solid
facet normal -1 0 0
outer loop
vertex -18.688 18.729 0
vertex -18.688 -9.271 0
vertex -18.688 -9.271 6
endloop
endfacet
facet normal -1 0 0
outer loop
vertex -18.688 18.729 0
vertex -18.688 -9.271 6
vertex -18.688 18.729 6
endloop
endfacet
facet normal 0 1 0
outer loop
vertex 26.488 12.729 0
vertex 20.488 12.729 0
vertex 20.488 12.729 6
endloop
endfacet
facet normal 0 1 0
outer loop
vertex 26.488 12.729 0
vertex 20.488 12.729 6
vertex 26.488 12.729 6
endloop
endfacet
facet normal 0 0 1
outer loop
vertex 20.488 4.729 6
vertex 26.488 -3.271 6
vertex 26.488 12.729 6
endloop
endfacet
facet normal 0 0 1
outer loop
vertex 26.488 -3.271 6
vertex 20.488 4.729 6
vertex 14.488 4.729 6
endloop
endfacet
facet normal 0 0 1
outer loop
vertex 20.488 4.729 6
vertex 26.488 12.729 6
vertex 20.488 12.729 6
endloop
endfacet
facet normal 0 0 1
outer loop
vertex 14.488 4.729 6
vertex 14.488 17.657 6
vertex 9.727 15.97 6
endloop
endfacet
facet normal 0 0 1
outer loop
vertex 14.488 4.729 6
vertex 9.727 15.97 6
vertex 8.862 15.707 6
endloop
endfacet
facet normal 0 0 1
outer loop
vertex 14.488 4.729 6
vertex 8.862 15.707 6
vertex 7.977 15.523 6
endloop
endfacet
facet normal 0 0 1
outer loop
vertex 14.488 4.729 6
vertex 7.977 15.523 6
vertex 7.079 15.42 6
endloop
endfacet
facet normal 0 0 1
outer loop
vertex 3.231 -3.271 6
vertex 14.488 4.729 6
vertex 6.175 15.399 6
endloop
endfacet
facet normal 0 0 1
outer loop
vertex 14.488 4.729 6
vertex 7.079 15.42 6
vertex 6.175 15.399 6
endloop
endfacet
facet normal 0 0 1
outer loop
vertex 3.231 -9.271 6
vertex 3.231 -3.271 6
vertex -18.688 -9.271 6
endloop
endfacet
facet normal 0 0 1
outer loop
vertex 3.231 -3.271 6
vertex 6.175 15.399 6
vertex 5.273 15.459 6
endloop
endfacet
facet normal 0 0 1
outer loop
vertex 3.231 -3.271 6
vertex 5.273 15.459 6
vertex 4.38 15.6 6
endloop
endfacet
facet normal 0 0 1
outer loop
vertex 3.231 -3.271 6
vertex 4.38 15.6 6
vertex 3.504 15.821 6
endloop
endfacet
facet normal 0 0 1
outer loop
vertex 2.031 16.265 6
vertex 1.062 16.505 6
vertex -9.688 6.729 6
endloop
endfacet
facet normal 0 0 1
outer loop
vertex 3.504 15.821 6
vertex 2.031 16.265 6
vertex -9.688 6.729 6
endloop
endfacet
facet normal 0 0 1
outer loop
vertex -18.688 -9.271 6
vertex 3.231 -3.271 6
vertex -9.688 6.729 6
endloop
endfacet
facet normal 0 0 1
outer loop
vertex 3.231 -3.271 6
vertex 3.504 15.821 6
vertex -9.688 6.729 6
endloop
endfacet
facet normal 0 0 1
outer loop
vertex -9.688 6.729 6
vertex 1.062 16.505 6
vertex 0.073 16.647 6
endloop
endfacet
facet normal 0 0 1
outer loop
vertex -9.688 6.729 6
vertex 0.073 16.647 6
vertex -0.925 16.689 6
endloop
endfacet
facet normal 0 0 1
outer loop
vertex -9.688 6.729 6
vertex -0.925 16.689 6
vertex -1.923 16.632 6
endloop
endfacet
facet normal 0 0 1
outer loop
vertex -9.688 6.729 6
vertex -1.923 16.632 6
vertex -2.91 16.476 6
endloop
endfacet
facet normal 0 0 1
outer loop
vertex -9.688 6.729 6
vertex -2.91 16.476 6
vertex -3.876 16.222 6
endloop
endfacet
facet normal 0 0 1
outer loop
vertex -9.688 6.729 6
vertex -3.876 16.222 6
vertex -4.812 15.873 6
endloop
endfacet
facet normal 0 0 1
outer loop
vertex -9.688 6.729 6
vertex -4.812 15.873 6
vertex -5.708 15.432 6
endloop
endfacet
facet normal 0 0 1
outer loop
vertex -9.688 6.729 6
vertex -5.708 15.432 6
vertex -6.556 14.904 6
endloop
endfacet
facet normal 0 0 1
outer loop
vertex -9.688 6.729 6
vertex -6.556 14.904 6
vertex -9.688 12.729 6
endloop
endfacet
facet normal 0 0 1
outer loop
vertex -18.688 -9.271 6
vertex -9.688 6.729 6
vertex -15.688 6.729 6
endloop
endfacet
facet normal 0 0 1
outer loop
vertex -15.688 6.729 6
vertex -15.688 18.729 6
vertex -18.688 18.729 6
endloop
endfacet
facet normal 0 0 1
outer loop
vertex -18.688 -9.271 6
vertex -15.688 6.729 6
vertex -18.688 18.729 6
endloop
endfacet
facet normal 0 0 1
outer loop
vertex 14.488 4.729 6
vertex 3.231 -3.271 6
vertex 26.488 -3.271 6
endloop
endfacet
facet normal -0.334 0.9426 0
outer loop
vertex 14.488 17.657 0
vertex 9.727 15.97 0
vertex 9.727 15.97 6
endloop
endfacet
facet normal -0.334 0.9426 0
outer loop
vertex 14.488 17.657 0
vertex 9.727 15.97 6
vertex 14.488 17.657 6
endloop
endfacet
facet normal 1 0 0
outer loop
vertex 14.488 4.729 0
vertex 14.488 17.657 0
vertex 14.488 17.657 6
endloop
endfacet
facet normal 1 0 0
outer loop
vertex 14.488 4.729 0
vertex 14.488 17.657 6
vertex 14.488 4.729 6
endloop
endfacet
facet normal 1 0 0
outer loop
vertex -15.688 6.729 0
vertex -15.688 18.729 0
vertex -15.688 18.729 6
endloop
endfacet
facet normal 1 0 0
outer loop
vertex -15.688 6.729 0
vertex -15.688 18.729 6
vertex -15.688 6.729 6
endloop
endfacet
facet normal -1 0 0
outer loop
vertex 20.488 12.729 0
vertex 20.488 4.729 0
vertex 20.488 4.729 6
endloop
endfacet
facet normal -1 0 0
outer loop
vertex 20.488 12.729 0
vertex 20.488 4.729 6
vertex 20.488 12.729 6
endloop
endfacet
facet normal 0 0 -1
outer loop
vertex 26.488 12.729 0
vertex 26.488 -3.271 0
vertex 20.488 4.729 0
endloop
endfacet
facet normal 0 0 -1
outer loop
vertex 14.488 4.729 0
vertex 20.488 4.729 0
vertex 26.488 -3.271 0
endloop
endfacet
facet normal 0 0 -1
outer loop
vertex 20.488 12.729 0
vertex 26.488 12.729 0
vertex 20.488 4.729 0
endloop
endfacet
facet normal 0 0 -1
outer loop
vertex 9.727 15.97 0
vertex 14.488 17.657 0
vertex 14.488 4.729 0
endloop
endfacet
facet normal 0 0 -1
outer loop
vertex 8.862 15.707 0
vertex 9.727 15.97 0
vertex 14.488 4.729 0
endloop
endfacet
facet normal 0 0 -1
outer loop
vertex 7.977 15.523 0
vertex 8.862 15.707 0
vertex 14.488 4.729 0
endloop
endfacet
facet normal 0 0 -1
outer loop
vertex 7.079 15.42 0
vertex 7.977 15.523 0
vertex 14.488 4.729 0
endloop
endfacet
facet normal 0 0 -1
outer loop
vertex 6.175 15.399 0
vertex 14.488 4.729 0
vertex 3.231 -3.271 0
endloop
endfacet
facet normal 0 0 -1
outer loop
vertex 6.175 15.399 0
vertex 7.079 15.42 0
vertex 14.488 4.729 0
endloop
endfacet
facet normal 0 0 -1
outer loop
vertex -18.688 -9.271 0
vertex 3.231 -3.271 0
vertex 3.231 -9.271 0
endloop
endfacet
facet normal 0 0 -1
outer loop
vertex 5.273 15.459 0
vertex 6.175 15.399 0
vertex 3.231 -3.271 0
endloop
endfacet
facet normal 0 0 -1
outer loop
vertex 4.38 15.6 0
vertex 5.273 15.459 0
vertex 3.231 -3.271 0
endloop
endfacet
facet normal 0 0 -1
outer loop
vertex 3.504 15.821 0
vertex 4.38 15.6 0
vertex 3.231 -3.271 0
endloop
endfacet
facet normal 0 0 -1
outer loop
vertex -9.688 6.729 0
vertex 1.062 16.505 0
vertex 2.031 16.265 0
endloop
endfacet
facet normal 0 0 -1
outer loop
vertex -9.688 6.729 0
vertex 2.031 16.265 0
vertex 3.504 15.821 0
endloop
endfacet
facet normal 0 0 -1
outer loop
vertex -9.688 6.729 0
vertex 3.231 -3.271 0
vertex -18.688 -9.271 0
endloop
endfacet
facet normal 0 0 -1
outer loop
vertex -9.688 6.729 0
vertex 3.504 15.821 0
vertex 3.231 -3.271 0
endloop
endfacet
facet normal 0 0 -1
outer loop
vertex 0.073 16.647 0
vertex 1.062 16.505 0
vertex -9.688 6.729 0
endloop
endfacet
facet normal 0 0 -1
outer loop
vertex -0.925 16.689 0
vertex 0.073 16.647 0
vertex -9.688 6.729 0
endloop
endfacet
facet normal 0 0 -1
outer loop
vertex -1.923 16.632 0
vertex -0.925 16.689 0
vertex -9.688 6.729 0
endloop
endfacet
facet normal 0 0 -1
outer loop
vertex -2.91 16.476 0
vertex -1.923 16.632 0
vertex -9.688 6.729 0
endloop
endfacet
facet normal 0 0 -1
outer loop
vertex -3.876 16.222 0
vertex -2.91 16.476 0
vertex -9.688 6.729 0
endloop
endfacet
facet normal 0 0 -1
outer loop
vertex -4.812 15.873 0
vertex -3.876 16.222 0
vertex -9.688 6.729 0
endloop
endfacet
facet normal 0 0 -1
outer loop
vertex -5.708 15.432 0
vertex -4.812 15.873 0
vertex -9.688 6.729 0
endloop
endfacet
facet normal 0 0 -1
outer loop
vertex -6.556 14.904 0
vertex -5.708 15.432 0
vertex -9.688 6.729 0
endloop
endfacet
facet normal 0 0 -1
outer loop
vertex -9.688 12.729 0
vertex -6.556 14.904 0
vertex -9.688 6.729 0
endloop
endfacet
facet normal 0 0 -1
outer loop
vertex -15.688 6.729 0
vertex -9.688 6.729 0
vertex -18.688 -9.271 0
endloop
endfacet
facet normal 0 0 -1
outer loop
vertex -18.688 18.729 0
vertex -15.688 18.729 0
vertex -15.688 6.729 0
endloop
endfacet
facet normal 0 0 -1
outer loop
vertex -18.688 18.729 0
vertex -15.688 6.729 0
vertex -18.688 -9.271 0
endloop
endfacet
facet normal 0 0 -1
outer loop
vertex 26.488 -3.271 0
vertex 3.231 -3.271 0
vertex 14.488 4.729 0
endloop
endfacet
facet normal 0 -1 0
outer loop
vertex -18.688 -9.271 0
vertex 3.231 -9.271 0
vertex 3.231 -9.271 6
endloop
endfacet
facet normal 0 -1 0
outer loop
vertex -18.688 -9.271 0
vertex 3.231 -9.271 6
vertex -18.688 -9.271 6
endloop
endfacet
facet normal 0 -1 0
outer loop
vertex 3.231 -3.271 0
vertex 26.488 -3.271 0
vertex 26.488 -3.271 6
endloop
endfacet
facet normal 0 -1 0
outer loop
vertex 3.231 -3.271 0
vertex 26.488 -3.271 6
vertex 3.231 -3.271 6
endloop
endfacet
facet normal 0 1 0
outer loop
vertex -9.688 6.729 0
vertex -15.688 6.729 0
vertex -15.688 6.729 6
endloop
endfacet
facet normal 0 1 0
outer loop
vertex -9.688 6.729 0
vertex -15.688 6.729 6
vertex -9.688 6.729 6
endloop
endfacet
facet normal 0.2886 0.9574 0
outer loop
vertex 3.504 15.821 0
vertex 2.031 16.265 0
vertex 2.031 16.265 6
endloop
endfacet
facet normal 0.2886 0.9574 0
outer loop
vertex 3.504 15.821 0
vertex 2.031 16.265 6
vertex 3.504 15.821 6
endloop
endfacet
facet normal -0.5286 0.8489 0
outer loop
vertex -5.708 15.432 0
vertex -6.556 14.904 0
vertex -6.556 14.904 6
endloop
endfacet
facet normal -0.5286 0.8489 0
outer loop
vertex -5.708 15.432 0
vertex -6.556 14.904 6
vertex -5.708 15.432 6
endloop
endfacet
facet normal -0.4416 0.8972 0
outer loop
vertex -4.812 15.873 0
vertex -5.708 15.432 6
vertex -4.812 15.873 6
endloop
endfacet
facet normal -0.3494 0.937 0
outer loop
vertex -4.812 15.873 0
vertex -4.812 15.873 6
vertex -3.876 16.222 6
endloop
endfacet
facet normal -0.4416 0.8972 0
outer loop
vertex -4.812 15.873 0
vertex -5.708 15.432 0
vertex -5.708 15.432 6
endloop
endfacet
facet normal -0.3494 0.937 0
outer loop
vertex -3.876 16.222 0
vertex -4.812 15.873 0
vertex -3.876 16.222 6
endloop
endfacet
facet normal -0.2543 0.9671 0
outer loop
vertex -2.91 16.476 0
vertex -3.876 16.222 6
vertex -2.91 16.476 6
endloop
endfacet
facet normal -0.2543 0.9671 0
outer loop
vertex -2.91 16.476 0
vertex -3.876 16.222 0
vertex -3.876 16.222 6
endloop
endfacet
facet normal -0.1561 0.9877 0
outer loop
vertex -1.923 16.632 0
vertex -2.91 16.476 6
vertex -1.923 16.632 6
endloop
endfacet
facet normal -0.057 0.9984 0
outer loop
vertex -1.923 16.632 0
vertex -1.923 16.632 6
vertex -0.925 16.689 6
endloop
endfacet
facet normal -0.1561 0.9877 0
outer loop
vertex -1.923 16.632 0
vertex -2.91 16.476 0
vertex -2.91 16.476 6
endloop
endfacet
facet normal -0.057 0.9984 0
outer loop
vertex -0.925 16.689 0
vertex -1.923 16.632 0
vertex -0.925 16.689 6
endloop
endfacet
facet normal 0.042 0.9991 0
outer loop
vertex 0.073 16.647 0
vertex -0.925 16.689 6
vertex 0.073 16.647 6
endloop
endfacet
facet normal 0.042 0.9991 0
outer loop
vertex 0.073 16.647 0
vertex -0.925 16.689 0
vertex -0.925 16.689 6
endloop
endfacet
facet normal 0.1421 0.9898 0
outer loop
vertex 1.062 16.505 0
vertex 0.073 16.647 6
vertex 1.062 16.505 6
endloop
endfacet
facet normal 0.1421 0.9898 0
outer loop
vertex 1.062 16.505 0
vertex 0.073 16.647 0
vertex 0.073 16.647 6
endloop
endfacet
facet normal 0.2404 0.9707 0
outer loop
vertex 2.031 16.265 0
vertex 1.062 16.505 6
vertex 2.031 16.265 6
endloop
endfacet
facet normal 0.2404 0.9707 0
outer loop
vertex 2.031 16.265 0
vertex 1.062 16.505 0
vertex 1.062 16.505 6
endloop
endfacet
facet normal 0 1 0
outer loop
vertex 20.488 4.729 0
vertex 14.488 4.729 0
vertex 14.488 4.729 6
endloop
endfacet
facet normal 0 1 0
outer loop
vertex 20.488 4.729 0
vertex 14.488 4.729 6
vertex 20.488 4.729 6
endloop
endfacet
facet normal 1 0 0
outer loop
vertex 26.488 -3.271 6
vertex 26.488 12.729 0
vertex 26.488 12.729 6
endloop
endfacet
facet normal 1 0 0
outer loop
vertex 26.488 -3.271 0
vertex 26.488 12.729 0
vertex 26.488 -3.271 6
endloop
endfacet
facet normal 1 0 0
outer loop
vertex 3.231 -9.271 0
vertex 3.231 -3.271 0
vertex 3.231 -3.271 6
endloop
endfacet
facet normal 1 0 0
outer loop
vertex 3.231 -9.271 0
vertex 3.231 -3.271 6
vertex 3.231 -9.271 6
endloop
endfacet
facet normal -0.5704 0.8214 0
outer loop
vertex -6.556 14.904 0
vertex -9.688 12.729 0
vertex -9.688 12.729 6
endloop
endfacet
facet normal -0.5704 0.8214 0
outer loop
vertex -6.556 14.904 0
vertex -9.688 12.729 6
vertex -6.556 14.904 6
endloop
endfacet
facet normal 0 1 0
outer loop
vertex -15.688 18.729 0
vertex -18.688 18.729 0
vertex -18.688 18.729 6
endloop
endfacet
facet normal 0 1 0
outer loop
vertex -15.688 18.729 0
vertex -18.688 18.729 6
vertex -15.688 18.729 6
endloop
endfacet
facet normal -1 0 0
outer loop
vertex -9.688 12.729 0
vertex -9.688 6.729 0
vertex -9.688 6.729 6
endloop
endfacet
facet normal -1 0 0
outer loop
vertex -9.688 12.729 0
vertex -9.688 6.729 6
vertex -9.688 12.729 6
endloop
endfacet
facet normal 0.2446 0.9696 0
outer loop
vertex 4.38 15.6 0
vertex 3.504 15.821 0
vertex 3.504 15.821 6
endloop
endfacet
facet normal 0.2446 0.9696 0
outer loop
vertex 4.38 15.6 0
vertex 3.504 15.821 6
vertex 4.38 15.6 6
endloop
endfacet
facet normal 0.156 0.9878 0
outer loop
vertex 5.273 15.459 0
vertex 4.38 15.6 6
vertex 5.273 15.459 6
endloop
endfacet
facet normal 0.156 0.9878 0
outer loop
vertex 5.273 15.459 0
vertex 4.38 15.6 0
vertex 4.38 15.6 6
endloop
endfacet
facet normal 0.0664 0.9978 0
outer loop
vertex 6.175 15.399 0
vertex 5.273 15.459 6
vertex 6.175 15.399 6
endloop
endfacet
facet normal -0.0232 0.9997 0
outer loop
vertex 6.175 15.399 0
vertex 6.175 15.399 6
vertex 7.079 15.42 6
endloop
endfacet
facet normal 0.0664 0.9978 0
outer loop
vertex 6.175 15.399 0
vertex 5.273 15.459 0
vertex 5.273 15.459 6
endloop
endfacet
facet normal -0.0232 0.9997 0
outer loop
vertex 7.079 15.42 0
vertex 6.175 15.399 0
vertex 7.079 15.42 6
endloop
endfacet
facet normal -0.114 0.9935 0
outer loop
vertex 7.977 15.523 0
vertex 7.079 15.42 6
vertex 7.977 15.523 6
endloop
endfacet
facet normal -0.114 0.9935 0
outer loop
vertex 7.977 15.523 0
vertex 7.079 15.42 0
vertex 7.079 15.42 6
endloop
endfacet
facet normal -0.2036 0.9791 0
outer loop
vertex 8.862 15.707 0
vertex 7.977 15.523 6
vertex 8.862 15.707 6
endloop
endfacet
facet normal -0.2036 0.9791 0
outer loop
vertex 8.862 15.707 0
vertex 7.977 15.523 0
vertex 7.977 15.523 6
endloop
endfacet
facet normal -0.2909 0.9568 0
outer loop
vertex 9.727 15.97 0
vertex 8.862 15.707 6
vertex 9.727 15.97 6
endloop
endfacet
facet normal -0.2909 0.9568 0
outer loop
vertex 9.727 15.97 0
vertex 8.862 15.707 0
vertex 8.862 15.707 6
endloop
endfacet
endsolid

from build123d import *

# Parameters (mm, degrees)
BOSS_EXTRUDE1_DEPTH = 6


with BuildPart() as part:
    # Sketch1 → Boss-Extrude1 (new body)
    with BuildSketch(Plane.XY):
        with BuildLine():
            Line((-18.687702572, 18.729195928), (-15.687702572, 18.729195928))
            Line((-15.687702572, 18.729195928), (-15.687702572, 6.729195928))
            Line((-15.687702572, 6.729195928), (-9.687702572, 6.729195928))
            Line((-9.687702572, 6.729195928), (-9.687702572, 12.729195928))
            Line((-9.687702572, 12.729195928), (-6.556235979, 14.903596974))
            ThreePointArc((-6.556235979, 14.903596974), (-2.418100544, 16.566329788), (2.031378501, 16.264698373))
            Line((2.031378501, 16.264698373), (3.503651069, 15.82124278))
            ThreePointArc((3.503651069, 15.82124278), (6.627191746, 15.399192613), (9.726940979, 15.970320798))
            Line((9.726940979, 15.970320798), (14.488027768, 17.656969749))
            Line((14.488027768, 17.656969749), (14.488027768, 4.729195928))
            Line((14.488027768, 4.729195928), (20.488027768, 4.729195928))
            Line((20.488027768, 4.729195928), (20.488027768, 12.729195928))
            Line((20.488027768, 12.729195928), (26.488027768, 12.729195928))
            Line((26.488027768, 12.729195928), (26.488027768, -3.270804072))
            Line((26.488027768, -3.270804072), (3.231231788, -3.270804072))
            Line((3.231231788, -3.270804072), (3.231231788, -9.270804072))
            Line((3.231231788, -9.270804072), (-18.687702572, -9.270804072))
            Line((-18.687702572, -9.270804072), (-18.687702572, 18.729195928))
        make_face()
    extrude(amount=BOSS_EXTRUDE1_DEPTH)


solid = part.part
